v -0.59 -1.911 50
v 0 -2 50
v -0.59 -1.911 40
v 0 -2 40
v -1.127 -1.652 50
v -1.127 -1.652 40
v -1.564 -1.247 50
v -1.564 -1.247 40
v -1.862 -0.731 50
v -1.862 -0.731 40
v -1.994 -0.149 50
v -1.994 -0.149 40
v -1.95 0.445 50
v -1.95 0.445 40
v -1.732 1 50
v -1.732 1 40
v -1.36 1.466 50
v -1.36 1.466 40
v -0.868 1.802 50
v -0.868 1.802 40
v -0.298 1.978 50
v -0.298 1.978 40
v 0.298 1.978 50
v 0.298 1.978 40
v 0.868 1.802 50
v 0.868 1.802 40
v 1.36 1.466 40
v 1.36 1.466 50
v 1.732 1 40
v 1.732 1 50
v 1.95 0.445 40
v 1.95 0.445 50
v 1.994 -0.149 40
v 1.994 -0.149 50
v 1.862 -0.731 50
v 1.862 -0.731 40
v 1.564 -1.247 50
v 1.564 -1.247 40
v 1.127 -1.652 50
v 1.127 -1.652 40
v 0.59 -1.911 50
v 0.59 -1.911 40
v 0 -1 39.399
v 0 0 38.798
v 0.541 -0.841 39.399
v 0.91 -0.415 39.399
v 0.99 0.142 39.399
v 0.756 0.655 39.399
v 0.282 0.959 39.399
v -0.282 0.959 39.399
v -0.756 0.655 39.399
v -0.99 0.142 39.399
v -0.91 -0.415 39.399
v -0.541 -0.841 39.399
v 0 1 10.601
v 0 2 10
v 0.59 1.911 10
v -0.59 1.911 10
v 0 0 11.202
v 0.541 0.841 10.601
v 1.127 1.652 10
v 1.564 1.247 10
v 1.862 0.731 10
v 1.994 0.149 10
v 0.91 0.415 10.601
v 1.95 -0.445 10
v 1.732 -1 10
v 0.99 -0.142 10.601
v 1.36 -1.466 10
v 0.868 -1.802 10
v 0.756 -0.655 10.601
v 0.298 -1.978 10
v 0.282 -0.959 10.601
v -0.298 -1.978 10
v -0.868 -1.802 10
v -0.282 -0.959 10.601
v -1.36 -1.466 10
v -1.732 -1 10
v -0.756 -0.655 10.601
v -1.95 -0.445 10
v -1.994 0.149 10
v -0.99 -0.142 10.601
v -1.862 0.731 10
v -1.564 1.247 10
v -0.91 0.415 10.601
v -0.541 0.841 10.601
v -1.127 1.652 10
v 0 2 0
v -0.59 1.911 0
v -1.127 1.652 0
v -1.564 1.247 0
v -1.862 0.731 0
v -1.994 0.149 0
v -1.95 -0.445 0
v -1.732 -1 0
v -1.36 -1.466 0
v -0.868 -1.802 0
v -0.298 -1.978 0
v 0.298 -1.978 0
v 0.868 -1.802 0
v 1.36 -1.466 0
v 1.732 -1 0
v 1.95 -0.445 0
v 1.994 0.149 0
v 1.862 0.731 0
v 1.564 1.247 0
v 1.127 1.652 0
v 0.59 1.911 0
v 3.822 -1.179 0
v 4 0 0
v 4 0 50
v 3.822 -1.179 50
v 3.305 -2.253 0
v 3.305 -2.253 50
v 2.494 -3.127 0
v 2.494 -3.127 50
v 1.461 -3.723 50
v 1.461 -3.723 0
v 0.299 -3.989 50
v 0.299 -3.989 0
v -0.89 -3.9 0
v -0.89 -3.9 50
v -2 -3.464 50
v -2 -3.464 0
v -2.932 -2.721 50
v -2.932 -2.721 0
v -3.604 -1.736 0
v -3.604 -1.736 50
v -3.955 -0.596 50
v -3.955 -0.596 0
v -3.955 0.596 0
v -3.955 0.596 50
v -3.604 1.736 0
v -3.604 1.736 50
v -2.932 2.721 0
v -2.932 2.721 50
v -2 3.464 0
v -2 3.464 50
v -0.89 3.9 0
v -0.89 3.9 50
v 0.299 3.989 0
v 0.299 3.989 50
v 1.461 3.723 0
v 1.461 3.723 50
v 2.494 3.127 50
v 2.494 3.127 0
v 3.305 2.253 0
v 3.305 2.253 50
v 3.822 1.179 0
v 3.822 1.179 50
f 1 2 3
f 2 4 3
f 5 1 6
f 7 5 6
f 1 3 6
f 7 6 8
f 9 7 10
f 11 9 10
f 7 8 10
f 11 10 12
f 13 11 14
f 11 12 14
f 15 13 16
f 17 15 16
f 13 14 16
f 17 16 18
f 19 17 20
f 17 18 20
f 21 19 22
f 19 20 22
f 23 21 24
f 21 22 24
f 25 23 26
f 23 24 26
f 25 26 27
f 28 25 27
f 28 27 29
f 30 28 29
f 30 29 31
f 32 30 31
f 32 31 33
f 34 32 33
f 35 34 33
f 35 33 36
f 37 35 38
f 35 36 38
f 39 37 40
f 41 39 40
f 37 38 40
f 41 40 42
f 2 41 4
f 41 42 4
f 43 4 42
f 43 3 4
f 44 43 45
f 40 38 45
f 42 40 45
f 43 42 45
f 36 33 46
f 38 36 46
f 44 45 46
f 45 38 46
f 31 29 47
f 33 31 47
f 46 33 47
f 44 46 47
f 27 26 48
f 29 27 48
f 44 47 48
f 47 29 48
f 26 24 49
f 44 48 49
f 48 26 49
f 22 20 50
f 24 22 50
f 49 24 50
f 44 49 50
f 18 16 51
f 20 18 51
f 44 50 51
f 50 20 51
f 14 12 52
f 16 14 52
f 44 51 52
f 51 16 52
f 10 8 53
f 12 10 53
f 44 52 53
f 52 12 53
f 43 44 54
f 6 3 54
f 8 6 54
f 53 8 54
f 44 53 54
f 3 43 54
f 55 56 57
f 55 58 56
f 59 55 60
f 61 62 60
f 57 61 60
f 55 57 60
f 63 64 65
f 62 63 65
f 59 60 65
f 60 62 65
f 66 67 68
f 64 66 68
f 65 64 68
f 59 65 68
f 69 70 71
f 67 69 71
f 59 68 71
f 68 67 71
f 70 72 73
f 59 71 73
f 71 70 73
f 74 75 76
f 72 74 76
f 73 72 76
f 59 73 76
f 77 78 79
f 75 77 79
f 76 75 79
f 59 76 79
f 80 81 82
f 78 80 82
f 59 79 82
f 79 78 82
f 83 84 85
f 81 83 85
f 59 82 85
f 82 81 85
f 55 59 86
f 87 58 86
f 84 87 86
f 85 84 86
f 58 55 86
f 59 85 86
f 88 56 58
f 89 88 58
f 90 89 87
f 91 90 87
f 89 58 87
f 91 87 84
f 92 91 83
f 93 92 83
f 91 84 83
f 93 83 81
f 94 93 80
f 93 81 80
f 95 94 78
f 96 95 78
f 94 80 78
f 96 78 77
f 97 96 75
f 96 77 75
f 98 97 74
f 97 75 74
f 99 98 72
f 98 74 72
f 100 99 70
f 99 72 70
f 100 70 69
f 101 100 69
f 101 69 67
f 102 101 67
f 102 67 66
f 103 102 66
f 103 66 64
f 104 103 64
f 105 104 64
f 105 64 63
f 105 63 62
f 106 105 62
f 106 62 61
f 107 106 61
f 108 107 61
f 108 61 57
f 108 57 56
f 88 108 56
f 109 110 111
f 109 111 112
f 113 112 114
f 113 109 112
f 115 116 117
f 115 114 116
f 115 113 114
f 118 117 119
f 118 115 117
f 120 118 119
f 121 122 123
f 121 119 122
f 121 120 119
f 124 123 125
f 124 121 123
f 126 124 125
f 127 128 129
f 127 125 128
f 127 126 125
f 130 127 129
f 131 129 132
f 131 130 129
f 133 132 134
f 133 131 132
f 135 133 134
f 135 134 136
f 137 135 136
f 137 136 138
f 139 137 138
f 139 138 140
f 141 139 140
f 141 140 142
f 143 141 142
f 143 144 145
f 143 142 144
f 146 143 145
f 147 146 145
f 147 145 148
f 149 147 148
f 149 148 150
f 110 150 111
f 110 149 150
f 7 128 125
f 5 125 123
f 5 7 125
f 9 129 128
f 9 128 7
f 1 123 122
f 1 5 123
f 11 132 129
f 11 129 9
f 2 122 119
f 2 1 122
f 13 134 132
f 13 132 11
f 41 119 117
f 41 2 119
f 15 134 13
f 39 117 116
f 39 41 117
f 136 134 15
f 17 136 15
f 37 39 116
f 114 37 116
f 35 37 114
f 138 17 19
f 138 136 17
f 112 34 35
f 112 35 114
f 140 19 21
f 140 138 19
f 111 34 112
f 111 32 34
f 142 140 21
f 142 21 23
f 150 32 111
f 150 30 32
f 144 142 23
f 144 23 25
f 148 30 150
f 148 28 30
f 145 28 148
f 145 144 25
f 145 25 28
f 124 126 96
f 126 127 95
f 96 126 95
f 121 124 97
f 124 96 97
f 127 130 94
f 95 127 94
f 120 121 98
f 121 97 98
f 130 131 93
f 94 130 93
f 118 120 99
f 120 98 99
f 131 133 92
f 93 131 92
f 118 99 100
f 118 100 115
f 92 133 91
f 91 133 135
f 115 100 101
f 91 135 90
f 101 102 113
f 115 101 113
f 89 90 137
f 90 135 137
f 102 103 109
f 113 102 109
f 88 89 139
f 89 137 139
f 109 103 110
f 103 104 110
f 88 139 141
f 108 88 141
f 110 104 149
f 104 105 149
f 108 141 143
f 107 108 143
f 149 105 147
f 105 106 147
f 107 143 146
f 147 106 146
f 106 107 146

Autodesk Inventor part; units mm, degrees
ref_plane "YZ Plane" through (0, 0, 0) normal (1, 0, 0) x (0, 1, 0)
ref_plane "XZ Plane" through (0, 0, 0) normal (0, 1, 0) x (-1, 0, 0)
ref_plane "XY Plane" through (0, 0, 0) normal (0, 0, 1) x (1, 0, 0)
sketch "Esquisse2" plane through (0, 0, 0) normal (0, 0, 1) x (1, 0, 0)
  circle A0 centre (0, 0) radius 4
  dimension "d4" = 8
extrude "Extrusion2" add sketch "Esquisse2" along normal blind 50
hole "Perçage1" at (0, 0, 50) direction (0, 0, -1) diameter 4 depth 10 tip angle 118
hole "Perçage2" at (0, 0, 0) direction (0, 0, 1) diameter 4 depth 10 tip angle 118
thread "Filetage1" size "M4x0.7" class "6H" standard "ANSI Metric M Profile" full length
thread "Filetage2" size "M4x0.7" class "6H" standard "ANSI Metric M Profile" full length
properties part number "Tube-4mm" material "Aluminium 6061"
